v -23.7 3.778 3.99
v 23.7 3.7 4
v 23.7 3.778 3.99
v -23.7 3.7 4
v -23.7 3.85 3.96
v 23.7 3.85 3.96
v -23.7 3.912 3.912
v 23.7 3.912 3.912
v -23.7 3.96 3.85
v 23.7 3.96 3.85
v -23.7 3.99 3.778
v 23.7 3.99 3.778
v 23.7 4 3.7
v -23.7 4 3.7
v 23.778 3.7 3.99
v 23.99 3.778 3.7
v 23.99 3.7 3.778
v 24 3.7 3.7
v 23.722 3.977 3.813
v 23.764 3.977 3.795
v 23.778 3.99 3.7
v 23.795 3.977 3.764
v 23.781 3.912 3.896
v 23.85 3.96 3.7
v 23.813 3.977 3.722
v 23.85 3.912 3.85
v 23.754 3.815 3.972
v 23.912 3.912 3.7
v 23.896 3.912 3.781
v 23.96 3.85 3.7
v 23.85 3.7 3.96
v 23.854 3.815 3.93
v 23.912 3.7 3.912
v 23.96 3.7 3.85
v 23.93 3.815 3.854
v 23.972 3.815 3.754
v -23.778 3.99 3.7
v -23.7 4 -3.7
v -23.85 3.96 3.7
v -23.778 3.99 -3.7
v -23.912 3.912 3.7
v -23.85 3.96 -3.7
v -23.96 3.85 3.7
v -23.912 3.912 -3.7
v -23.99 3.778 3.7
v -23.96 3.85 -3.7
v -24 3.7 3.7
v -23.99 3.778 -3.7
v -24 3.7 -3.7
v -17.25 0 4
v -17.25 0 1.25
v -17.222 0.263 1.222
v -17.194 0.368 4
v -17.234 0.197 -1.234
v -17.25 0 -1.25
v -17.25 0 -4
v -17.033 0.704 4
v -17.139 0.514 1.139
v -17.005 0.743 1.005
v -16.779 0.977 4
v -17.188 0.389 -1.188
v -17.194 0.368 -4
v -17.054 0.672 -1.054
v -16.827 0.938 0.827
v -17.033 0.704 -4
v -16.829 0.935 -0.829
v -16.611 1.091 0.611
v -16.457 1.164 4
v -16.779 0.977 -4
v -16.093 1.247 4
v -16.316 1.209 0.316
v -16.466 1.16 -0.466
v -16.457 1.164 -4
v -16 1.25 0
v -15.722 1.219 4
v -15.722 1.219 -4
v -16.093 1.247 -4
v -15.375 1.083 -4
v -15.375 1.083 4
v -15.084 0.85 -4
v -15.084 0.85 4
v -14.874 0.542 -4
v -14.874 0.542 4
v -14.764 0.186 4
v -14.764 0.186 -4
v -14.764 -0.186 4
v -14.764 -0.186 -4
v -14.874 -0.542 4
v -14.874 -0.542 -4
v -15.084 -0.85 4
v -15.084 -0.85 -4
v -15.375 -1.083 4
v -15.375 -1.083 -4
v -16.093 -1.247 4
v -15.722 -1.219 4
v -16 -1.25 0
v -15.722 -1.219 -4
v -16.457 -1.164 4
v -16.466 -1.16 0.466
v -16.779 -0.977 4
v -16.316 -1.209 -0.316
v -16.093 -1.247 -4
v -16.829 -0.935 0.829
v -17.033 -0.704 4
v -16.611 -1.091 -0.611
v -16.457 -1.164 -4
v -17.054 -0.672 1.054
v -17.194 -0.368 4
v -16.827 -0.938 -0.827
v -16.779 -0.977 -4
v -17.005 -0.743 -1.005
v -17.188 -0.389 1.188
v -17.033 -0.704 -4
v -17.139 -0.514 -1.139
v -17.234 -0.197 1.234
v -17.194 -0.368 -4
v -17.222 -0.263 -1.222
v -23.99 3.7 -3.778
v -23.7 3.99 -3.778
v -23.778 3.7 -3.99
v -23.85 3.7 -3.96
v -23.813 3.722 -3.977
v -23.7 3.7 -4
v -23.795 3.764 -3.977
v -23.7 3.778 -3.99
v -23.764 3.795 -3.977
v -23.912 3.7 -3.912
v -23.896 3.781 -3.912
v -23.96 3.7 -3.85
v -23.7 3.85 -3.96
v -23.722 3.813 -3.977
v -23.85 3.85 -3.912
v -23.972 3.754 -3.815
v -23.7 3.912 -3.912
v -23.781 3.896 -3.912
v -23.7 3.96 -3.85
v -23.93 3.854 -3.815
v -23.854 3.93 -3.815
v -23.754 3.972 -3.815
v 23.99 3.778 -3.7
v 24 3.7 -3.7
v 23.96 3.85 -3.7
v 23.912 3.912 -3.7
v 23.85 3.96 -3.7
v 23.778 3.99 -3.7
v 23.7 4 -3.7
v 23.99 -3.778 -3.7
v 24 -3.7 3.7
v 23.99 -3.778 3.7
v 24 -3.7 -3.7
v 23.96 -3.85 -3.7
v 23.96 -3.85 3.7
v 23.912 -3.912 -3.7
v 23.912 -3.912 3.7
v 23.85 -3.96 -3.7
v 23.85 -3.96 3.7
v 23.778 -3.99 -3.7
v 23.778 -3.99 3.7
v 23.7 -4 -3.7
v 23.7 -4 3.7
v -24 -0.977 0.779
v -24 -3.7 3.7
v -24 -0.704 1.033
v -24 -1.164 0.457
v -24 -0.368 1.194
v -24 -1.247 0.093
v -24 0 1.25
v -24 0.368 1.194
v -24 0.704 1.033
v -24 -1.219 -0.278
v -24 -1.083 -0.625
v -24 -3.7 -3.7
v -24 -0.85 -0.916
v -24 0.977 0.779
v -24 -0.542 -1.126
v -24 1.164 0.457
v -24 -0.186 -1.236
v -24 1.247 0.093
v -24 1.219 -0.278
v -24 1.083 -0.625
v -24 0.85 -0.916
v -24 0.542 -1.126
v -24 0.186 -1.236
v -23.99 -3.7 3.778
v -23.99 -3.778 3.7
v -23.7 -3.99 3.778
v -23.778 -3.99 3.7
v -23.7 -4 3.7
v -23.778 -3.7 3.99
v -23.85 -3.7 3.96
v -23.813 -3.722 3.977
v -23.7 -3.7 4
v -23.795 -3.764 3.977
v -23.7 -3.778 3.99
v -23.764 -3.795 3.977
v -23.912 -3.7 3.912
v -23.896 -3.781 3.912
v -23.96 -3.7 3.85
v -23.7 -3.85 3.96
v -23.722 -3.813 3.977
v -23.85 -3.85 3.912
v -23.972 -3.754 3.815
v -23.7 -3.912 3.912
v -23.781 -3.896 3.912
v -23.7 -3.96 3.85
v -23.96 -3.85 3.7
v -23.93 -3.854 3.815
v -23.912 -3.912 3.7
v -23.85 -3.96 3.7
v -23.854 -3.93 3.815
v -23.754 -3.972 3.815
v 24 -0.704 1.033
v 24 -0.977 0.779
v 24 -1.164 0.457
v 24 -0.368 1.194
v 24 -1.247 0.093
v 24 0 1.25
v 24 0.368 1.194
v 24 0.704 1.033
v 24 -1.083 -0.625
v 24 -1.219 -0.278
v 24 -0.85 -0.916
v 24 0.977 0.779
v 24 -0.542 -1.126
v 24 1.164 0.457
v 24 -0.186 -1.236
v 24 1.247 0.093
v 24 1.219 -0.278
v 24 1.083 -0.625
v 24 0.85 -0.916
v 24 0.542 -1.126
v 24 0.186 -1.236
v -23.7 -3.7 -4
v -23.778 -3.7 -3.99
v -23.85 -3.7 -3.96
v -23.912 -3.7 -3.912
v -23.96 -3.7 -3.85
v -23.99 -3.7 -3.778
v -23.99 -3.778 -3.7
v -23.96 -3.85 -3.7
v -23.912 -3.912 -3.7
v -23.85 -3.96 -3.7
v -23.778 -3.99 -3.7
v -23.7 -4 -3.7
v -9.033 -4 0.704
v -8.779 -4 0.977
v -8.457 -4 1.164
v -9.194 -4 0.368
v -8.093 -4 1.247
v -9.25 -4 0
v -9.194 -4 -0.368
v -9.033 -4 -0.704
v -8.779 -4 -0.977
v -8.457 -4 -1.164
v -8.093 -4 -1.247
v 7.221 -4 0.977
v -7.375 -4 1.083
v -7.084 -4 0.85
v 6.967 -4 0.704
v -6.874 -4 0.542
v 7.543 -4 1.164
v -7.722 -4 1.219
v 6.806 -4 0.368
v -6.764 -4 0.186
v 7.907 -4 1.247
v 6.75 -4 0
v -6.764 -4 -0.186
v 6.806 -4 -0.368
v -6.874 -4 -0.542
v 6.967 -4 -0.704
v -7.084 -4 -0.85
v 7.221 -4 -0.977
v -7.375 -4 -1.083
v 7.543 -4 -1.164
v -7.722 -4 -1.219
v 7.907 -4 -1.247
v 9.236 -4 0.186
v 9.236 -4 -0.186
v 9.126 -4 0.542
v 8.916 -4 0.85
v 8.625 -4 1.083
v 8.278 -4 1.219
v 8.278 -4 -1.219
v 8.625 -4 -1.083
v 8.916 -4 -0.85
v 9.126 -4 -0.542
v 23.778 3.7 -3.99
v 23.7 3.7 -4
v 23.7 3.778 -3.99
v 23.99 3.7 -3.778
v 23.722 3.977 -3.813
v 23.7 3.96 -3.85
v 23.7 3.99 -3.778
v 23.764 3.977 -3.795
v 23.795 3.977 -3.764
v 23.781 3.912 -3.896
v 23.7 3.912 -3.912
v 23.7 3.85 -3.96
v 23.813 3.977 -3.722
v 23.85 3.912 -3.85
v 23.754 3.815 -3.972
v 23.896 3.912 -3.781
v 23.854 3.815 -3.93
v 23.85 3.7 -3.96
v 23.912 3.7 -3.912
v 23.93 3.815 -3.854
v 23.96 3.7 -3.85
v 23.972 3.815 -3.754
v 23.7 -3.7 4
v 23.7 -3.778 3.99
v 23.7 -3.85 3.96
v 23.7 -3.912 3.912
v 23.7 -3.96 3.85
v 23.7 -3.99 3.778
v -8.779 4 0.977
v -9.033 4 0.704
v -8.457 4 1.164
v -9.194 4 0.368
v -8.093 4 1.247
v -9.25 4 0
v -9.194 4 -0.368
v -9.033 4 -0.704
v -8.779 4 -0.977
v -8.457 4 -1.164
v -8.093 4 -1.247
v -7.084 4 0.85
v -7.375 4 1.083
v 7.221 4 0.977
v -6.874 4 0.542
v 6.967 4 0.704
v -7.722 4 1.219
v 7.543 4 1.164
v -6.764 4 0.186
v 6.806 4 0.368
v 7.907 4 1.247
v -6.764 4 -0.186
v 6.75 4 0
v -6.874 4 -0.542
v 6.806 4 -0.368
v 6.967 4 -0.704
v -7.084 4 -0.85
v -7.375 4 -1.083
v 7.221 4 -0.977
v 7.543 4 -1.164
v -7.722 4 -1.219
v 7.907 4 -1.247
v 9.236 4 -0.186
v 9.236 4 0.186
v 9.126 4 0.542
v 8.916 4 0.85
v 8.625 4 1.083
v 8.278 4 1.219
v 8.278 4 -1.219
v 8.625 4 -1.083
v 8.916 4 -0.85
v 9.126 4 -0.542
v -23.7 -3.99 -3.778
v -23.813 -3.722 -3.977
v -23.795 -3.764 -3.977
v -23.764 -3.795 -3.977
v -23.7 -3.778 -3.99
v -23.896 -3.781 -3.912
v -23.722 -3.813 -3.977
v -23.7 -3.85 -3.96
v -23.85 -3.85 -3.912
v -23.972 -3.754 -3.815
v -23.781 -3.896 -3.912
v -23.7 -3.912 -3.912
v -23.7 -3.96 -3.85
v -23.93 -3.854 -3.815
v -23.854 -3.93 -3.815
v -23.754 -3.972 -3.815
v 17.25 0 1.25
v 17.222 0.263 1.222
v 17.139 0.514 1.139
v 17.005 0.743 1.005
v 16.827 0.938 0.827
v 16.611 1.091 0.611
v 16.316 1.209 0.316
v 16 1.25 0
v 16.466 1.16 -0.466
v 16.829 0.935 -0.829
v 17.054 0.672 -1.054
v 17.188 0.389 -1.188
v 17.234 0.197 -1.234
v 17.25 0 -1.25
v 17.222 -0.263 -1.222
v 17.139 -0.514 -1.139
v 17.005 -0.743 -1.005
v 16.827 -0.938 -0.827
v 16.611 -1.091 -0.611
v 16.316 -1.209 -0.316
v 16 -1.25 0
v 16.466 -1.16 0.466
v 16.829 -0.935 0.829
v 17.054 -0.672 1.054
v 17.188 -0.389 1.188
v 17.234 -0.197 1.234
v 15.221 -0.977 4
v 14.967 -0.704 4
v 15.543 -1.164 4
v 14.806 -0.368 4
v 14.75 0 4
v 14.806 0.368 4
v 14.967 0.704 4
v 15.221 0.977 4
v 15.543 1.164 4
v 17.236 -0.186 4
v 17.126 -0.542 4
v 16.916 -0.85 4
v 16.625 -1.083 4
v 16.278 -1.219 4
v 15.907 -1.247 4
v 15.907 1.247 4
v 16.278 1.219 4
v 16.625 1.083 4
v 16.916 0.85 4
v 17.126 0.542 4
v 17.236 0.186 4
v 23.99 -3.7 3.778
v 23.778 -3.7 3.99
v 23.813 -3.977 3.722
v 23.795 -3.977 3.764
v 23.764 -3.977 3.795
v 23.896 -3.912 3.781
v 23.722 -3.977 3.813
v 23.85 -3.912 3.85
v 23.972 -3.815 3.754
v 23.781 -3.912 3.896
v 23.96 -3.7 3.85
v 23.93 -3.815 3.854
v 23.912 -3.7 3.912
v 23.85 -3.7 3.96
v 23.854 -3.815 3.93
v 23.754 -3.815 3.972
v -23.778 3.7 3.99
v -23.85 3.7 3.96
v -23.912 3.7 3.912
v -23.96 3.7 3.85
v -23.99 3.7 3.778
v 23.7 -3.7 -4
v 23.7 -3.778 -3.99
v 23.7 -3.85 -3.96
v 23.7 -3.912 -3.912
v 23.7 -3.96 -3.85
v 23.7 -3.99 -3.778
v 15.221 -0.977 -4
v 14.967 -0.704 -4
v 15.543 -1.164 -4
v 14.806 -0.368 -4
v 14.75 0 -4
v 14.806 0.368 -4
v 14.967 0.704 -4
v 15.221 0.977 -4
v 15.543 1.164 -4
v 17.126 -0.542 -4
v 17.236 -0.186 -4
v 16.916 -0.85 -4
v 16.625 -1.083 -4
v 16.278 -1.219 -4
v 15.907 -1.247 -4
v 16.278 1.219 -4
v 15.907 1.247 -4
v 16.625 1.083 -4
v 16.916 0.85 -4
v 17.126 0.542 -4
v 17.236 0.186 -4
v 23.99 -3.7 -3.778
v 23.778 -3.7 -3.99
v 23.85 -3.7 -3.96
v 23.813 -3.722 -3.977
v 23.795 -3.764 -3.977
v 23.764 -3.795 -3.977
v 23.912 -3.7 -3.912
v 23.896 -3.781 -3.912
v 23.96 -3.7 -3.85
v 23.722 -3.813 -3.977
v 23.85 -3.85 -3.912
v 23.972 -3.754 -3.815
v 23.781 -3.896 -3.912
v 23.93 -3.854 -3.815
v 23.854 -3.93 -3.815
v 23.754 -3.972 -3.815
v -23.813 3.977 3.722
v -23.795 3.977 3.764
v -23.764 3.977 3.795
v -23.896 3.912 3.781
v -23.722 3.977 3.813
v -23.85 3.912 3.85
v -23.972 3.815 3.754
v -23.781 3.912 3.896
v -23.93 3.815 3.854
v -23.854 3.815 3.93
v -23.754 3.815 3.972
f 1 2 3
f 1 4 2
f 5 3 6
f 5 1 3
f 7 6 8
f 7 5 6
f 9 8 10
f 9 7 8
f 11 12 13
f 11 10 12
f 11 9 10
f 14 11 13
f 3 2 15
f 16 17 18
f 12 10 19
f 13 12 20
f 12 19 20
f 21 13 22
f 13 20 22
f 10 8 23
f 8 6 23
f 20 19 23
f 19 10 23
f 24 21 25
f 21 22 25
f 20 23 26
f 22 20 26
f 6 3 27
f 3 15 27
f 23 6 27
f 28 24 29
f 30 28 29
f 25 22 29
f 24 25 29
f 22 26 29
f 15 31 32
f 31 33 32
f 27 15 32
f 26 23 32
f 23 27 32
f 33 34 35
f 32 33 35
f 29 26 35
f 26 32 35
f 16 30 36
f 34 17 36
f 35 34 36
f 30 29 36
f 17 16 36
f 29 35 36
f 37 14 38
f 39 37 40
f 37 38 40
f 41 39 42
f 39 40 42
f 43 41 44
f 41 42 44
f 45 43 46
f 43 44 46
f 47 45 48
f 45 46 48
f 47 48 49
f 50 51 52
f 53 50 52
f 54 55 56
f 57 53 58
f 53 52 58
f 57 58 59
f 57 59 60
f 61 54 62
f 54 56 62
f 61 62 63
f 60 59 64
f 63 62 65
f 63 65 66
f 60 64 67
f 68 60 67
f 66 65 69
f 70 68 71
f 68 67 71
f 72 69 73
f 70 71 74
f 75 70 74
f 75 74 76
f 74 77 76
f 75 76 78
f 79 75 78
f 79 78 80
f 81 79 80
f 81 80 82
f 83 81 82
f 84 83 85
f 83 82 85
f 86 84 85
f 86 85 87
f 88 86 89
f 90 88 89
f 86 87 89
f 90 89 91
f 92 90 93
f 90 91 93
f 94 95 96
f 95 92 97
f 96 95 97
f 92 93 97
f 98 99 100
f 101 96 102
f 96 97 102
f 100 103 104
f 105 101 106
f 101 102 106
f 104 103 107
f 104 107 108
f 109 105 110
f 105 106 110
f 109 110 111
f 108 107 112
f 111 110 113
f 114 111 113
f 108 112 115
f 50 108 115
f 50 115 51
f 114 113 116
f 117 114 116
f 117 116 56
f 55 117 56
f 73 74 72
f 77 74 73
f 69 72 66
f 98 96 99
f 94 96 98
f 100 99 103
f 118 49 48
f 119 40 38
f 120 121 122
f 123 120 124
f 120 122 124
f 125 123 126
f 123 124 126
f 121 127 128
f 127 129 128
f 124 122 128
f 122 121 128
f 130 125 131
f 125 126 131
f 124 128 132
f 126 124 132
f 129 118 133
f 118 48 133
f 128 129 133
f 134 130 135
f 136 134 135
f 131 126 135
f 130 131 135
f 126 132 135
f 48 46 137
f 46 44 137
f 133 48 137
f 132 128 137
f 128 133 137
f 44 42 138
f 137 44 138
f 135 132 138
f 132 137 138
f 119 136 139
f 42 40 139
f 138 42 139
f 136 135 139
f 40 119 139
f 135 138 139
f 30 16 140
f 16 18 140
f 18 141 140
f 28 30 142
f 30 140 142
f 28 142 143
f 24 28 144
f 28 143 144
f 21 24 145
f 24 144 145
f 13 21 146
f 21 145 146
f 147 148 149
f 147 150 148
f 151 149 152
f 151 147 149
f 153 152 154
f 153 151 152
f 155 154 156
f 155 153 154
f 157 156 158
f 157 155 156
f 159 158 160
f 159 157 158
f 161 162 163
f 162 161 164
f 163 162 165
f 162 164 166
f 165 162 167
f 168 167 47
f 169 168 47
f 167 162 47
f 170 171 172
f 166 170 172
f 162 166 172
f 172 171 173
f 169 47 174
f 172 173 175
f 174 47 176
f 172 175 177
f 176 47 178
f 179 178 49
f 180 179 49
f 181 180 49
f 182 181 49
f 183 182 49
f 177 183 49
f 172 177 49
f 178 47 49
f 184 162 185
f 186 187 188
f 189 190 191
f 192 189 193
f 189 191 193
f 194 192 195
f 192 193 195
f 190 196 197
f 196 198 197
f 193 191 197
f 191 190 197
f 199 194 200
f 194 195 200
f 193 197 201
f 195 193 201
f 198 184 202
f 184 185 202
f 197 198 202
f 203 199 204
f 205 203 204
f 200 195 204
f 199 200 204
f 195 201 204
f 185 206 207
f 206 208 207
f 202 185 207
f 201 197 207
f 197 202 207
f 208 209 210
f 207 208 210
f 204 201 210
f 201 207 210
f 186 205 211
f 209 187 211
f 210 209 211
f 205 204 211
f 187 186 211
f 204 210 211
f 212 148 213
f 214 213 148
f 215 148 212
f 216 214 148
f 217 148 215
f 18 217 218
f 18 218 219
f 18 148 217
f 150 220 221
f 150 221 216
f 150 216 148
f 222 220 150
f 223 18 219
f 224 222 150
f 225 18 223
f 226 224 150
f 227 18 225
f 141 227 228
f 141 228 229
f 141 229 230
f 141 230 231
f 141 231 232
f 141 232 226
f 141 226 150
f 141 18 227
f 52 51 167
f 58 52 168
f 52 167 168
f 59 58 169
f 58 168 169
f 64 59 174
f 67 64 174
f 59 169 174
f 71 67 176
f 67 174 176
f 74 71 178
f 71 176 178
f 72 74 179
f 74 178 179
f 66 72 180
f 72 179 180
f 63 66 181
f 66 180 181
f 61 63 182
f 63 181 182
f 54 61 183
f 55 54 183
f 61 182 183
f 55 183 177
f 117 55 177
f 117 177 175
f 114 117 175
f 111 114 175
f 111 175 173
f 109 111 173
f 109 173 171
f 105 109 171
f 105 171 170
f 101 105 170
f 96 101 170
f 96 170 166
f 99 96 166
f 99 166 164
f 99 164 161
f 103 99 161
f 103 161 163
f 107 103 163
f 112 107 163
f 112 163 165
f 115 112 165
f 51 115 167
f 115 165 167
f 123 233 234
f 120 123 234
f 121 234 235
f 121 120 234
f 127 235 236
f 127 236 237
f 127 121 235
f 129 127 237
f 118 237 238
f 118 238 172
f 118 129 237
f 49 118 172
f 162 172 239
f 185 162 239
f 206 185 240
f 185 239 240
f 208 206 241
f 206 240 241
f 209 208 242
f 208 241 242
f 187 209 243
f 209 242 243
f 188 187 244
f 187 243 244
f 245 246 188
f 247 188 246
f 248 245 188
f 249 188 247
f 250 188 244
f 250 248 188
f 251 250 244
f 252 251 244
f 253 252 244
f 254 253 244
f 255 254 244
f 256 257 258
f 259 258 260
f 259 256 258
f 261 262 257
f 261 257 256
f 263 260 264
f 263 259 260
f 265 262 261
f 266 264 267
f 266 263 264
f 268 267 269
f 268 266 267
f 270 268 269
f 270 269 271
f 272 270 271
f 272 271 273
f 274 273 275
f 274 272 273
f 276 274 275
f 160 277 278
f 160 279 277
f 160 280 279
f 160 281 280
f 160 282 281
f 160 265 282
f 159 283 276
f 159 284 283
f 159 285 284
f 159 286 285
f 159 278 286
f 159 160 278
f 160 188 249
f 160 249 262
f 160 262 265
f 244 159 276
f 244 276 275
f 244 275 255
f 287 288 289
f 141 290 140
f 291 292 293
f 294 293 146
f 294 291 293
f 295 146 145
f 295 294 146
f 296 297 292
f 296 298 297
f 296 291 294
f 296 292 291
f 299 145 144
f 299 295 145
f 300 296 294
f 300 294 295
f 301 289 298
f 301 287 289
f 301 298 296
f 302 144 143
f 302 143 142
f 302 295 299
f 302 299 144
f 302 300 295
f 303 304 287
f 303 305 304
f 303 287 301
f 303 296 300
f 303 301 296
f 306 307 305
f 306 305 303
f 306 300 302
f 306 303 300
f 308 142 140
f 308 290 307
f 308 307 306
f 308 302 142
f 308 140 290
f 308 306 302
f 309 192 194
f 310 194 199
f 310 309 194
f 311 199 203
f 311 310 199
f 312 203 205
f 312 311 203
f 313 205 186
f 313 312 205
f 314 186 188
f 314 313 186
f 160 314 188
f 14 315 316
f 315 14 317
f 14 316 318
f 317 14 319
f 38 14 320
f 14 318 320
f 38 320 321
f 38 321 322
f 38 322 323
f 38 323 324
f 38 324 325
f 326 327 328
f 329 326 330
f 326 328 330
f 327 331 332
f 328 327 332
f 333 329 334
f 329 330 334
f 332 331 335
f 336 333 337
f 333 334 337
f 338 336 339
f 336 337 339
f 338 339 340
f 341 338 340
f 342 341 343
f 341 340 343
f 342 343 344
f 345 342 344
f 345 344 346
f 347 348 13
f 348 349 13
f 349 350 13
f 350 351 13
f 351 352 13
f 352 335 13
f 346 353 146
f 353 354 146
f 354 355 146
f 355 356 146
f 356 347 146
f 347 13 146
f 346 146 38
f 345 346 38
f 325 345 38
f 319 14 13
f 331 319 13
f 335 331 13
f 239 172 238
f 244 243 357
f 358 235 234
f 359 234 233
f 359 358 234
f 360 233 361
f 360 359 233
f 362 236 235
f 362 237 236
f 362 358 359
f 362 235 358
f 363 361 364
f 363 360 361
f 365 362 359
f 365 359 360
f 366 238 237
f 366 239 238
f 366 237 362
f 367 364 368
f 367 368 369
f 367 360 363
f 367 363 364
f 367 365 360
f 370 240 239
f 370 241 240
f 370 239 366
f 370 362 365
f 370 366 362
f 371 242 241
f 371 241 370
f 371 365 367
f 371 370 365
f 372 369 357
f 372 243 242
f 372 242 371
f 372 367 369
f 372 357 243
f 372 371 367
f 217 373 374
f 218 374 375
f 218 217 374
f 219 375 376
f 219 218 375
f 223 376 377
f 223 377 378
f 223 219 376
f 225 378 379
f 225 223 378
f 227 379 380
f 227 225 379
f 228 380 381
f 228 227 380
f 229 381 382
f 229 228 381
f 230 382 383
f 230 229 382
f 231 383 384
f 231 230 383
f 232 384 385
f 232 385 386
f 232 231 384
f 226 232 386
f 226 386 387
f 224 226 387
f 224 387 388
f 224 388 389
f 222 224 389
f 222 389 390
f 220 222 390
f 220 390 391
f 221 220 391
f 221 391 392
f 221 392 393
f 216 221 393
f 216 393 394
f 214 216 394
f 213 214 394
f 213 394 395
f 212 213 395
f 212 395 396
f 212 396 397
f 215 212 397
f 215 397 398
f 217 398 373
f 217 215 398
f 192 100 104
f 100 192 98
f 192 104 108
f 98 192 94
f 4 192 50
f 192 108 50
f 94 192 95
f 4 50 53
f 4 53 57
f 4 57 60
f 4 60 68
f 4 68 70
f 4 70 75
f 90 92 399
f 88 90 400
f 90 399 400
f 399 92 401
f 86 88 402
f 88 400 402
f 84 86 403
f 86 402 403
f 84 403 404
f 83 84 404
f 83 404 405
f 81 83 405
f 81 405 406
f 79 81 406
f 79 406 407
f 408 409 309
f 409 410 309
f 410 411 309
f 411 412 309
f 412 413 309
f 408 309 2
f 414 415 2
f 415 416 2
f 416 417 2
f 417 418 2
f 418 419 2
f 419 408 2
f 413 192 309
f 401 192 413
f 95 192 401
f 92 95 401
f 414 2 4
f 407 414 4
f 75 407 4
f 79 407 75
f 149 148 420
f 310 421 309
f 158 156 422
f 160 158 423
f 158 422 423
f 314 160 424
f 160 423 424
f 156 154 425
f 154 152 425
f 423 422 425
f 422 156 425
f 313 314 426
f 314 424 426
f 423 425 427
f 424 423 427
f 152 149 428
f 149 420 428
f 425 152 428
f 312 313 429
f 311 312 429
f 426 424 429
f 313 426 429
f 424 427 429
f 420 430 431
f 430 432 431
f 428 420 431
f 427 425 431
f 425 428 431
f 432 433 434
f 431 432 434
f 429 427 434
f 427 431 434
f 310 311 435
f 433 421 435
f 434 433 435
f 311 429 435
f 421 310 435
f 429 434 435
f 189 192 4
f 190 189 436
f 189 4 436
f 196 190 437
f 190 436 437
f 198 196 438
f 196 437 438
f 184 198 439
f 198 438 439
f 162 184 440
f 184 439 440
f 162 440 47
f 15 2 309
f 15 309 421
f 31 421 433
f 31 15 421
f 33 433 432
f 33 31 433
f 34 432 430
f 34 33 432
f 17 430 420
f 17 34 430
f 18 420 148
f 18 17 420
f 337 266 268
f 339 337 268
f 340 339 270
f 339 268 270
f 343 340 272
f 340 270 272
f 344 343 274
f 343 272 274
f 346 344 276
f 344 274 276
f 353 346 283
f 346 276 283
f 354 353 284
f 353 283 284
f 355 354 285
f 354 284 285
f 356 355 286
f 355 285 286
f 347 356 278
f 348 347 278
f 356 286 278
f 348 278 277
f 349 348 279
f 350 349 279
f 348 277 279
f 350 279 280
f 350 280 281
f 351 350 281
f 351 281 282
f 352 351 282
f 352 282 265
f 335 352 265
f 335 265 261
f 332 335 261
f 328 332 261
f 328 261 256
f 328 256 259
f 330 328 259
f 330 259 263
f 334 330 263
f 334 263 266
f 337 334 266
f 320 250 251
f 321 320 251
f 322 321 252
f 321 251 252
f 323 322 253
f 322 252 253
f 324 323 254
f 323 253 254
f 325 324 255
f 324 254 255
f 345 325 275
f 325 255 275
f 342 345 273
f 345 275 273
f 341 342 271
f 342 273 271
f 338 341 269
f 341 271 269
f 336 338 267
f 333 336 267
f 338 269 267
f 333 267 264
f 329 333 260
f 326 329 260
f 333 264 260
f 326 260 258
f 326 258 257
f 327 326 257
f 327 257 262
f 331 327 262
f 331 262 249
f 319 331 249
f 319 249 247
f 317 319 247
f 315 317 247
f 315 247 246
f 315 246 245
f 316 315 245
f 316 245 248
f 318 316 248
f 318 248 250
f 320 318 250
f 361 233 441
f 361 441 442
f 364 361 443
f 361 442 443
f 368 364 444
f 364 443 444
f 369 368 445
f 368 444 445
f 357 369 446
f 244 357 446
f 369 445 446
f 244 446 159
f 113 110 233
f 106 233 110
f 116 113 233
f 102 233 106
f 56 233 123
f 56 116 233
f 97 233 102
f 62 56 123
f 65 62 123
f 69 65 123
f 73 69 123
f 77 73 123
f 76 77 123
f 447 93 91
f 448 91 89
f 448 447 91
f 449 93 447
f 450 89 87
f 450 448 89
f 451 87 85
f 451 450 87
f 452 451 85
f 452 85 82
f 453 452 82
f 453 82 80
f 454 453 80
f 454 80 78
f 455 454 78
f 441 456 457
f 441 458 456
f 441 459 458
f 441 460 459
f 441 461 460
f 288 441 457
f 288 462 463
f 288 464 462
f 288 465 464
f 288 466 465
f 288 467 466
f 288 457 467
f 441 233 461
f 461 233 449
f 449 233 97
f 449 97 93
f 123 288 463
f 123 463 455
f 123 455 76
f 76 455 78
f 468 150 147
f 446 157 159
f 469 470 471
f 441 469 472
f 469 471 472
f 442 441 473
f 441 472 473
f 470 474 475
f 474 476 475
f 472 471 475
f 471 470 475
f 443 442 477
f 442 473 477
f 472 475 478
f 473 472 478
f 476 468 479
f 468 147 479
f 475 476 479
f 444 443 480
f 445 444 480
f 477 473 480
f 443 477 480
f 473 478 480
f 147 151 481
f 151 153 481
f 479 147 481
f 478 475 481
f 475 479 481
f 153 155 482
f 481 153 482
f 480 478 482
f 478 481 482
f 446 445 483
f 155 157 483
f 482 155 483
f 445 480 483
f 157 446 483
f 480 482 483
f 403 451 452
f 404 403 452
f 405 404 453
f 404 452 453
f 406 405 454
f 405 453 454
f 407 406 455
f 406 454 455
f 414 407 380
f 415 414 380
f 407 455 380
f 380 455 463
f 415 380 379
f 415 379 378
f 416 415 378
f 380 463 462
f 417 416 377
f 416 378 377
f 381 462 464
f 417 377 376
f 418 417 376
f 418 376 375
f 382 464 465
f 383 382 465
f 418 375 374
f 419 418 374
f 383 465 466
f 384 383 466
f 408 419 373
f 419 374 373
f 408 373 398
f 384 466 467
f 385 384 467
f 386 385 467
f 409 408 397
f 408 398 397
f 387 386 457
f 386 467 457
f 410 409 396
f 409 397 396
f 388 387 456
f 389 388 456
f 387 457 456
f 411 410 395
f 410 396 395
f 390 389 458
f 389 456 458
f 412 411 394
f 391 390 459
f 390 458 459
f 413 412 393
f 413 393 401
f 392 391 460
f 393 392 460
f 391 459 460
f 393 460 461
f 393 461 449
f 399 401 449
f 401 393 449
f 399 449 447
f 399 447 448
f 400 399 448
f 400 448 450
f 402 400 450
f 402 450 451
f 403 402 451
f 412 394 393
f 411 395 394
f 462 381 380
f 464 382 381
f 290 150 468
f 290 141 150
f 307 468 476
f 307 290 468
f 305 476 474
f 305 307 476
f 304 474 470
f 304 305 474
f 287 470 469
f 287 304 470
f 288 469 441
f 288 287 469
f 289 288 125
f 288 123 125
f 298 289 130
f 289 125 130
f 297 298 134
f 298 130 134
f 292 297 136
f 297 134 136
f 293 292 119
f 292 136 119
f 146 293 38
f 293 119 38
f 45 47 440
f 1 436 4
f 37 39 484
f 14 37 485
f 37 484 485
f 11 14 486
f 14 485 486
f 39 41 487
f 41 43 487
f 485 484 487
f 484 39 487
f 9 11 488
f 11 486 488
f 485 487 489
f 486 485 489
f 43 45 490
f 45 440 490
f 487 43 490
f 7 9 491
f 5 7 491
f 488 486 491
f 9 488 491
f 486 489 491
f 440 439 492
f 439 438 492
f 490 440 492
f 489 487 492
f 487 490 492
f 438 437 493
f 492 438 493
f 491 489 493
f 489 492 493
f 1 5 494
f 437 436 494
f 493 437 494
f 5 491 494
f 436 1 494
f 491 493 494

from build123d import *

# Parameters (mm, degrees)
SKETCH_1_W           = 8
SKETCH_1_H           = 8
EXTRUDE_1_DEPTH      = 24
FILLET_1_R           = 0.3
HOLE_WIZARD_1_D      = 2.5
HOLE_WIZARD_2_D      = 2.5
HOLE_WIZARD_3_REACH  = 50.332
HOLE_WIZARD_3_BORE_R = 1.25


with BuildPart() as part:
    # 草图1 → 凸台-拉伸1 (new, symmetric)
    with BuildSketch(Plane(origin=(0, 0, 0), x_dir=(0, 0, -1), z_dir=(1, 0, 0))):
        Rectangle(SKETCH_1_W, SKETCH_1_H)
    extrude(amount=EXTRUDE_1_DEPTH, both=True)

    # 圆角1
    fillet_1_edges = [part.edges().sort_by_distance(p)[0] for p in [
        (24, 0, 4),
        (24, -4, 0),
        (24, 0, -4),
        (-24, -4, 0),
        (-24, 0, 4),
        (-24, 4, 0),
        (-24, 0, -4),
        (0, -4, -4),
        (0, -4, 4),
        (0, 4, 4),
        (0, 4, -4),
        (24, 4, 0),
    ]]
    fillet(fillet_1_edges, radius=FILLET_1_R)

    # 螺纹孔1 (through all)
    with Locations(Plane(origin=(0, 4, 0), x_dir=(1, 0, 0), z_dir=(0, 1, 0))):
        with Locations((-8, 0), (8, 0)):
            Hole(HOLE_WIZARD_1_D / 2)

    # 螺纹孔2 (through all)
    with Locations(Plane.XY.offset(4)):
        with Locations((-16, 0), (16, 0)):
            Hole(HOLE_WIZARD_2_D / 2)

    # 螺纹孔3 bore → 螺纹孔3 (cut, up to next)
    with BuildSketch(Plane.ZY.offset(24), mode=Mode.PRIVATE) as hole_wizard_3_sk1:
        Circle(HOLE_WIZARD_3_BORE_R)
    hole_wizard_3_tool1 = extrude(hole_wizard_3_sk1.sketch, amount=-HOLE_WIZARD_3_REACH, mode=Mode.PRIVATE) & part.part
    hole_wizard_3 = hole_wizard_3_tool1.solids().sort_by_distance((-24, 0, 0))[0]
    add(hole_wizard_3, mode=Mode.SUBTRACT)

    # 镜向1: 螺纹孔3 across plane
    add(hole_wizard_3.mirror(Plane(origin=(0, 0, 0), x_dir=(0, 0, 1), z_dir=(1, 0, 0))), mode=Mode.SUBTRACT)


solid = part.part
